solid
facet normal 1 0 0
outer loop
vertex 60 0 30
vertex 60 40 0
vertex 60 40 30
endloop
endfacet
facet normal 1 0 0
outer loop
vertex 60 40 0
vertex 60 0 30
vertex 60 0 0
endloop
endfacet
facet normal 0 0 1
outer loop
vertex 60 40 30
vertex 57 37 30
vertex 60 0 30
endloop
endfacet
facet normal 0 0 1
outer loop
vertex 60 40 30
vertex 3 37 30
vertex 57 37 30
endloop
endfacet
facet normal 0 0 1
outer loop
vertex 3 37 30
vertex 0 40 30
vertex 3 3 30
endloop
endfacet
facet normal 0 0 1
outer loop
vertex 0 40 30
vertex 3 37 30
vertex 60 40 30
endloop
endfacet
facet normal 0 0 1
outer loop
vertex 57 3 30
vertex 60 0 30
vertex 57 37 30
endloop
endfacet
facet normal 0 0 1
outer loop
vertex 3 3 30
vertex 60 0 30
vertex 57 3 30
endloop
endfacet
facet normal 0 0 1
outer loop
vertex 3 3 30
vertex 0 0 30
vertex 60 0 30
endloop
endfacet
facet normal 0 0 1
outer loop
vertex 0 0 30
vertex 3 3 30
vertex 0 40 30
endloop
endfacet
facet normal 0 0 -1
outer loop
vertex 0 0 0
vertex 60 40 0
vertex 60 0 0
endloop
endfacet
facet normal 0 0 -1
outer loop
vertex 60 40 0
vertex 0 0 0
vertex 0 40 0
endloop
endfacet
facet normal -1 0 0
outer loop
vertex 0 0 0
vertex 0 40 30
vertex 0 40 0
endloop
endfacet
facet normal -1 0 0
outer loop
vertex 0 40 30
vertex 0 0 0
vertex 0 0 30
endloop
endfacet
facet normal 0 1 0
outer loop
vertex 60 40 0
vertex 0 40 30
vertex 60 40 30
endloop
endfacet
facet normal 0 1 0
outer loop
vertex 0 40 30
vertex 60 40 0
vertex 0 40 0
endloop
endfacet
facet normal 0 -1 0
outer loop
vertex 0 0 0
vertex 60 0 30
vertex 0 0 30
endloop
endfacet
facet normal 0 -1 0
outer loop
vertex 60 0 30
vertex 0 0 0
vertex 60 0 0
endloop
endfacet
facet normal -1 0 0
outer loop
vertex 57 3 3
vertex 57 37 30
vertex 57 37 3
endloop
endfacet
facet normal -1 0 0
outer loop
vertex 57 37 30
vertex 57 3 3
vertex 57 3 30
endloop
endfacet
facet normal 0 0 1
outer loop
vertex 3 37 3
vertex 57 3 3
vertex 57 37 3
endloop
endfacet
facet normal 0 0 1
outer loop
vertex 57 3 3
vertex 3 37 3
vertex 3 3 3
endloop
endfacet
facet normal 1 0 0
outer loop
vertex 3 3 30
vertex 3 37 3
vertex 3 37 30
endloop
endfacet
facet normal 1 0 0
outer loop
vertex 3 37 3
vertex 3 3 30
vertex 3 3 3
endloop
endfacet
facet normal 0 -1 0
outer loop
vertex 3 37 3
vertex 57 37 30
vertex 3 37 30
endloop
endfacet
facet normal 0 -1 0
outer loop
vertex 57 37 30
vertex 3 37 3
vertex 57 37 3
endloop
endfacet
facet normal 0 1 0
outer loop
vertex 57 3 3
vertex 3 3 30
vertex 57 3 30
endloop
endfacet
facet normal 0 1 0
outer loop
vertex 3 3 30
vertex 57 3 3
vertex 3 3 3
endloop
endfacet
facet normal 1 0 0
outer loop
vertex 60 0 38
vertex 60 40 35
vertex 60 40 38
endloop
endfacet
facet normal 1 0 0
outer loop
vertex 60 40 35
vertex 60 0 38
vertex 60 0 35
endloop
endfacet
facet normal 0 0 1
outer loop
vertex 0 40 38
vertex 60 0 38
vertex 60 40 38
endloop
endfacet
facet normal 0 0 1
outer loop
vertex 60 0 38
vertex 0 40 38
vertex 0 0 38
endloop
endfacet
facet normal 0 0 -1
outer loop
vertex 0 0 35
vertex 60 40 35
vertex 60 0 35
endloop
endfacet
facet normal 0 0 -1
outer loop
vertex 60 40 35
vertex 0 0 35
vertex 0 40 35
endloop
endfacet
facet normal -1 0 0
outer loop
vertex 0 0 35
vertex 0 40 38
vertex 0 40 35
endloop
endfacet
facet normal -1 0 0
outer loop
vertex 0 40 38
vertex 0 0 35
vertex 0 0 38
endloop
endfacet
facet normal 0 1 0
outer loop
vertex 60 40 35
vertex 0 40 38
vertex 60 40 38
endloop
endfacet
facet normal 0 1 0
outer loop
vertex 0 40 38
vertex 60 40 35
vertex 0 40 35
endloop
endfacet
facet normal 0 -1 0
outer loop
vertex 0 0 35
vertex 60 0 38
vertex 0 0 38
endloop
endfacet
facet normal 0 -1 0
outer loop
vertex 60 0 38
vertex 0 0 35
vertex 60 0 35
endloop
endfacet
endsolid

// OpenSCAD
module caja(ancho, profundidad, altura, espesor) {
    difference() {
        cube([ancho, profundidad, altura]);
        translate([espesor, espesor, espesor]) 
            cube([ancho - 2*espesor, profundidad - 2*espesor, altura]);
    }
}

module tapa(ancho, profundidad, espesor) {
    cube([ancho, profundidad, espesor]);
}

// Dibujar caja y tapa
caja(60, 40, 30, 3);
translate([0, 0, 35]) tapa(60, 40, 3);
